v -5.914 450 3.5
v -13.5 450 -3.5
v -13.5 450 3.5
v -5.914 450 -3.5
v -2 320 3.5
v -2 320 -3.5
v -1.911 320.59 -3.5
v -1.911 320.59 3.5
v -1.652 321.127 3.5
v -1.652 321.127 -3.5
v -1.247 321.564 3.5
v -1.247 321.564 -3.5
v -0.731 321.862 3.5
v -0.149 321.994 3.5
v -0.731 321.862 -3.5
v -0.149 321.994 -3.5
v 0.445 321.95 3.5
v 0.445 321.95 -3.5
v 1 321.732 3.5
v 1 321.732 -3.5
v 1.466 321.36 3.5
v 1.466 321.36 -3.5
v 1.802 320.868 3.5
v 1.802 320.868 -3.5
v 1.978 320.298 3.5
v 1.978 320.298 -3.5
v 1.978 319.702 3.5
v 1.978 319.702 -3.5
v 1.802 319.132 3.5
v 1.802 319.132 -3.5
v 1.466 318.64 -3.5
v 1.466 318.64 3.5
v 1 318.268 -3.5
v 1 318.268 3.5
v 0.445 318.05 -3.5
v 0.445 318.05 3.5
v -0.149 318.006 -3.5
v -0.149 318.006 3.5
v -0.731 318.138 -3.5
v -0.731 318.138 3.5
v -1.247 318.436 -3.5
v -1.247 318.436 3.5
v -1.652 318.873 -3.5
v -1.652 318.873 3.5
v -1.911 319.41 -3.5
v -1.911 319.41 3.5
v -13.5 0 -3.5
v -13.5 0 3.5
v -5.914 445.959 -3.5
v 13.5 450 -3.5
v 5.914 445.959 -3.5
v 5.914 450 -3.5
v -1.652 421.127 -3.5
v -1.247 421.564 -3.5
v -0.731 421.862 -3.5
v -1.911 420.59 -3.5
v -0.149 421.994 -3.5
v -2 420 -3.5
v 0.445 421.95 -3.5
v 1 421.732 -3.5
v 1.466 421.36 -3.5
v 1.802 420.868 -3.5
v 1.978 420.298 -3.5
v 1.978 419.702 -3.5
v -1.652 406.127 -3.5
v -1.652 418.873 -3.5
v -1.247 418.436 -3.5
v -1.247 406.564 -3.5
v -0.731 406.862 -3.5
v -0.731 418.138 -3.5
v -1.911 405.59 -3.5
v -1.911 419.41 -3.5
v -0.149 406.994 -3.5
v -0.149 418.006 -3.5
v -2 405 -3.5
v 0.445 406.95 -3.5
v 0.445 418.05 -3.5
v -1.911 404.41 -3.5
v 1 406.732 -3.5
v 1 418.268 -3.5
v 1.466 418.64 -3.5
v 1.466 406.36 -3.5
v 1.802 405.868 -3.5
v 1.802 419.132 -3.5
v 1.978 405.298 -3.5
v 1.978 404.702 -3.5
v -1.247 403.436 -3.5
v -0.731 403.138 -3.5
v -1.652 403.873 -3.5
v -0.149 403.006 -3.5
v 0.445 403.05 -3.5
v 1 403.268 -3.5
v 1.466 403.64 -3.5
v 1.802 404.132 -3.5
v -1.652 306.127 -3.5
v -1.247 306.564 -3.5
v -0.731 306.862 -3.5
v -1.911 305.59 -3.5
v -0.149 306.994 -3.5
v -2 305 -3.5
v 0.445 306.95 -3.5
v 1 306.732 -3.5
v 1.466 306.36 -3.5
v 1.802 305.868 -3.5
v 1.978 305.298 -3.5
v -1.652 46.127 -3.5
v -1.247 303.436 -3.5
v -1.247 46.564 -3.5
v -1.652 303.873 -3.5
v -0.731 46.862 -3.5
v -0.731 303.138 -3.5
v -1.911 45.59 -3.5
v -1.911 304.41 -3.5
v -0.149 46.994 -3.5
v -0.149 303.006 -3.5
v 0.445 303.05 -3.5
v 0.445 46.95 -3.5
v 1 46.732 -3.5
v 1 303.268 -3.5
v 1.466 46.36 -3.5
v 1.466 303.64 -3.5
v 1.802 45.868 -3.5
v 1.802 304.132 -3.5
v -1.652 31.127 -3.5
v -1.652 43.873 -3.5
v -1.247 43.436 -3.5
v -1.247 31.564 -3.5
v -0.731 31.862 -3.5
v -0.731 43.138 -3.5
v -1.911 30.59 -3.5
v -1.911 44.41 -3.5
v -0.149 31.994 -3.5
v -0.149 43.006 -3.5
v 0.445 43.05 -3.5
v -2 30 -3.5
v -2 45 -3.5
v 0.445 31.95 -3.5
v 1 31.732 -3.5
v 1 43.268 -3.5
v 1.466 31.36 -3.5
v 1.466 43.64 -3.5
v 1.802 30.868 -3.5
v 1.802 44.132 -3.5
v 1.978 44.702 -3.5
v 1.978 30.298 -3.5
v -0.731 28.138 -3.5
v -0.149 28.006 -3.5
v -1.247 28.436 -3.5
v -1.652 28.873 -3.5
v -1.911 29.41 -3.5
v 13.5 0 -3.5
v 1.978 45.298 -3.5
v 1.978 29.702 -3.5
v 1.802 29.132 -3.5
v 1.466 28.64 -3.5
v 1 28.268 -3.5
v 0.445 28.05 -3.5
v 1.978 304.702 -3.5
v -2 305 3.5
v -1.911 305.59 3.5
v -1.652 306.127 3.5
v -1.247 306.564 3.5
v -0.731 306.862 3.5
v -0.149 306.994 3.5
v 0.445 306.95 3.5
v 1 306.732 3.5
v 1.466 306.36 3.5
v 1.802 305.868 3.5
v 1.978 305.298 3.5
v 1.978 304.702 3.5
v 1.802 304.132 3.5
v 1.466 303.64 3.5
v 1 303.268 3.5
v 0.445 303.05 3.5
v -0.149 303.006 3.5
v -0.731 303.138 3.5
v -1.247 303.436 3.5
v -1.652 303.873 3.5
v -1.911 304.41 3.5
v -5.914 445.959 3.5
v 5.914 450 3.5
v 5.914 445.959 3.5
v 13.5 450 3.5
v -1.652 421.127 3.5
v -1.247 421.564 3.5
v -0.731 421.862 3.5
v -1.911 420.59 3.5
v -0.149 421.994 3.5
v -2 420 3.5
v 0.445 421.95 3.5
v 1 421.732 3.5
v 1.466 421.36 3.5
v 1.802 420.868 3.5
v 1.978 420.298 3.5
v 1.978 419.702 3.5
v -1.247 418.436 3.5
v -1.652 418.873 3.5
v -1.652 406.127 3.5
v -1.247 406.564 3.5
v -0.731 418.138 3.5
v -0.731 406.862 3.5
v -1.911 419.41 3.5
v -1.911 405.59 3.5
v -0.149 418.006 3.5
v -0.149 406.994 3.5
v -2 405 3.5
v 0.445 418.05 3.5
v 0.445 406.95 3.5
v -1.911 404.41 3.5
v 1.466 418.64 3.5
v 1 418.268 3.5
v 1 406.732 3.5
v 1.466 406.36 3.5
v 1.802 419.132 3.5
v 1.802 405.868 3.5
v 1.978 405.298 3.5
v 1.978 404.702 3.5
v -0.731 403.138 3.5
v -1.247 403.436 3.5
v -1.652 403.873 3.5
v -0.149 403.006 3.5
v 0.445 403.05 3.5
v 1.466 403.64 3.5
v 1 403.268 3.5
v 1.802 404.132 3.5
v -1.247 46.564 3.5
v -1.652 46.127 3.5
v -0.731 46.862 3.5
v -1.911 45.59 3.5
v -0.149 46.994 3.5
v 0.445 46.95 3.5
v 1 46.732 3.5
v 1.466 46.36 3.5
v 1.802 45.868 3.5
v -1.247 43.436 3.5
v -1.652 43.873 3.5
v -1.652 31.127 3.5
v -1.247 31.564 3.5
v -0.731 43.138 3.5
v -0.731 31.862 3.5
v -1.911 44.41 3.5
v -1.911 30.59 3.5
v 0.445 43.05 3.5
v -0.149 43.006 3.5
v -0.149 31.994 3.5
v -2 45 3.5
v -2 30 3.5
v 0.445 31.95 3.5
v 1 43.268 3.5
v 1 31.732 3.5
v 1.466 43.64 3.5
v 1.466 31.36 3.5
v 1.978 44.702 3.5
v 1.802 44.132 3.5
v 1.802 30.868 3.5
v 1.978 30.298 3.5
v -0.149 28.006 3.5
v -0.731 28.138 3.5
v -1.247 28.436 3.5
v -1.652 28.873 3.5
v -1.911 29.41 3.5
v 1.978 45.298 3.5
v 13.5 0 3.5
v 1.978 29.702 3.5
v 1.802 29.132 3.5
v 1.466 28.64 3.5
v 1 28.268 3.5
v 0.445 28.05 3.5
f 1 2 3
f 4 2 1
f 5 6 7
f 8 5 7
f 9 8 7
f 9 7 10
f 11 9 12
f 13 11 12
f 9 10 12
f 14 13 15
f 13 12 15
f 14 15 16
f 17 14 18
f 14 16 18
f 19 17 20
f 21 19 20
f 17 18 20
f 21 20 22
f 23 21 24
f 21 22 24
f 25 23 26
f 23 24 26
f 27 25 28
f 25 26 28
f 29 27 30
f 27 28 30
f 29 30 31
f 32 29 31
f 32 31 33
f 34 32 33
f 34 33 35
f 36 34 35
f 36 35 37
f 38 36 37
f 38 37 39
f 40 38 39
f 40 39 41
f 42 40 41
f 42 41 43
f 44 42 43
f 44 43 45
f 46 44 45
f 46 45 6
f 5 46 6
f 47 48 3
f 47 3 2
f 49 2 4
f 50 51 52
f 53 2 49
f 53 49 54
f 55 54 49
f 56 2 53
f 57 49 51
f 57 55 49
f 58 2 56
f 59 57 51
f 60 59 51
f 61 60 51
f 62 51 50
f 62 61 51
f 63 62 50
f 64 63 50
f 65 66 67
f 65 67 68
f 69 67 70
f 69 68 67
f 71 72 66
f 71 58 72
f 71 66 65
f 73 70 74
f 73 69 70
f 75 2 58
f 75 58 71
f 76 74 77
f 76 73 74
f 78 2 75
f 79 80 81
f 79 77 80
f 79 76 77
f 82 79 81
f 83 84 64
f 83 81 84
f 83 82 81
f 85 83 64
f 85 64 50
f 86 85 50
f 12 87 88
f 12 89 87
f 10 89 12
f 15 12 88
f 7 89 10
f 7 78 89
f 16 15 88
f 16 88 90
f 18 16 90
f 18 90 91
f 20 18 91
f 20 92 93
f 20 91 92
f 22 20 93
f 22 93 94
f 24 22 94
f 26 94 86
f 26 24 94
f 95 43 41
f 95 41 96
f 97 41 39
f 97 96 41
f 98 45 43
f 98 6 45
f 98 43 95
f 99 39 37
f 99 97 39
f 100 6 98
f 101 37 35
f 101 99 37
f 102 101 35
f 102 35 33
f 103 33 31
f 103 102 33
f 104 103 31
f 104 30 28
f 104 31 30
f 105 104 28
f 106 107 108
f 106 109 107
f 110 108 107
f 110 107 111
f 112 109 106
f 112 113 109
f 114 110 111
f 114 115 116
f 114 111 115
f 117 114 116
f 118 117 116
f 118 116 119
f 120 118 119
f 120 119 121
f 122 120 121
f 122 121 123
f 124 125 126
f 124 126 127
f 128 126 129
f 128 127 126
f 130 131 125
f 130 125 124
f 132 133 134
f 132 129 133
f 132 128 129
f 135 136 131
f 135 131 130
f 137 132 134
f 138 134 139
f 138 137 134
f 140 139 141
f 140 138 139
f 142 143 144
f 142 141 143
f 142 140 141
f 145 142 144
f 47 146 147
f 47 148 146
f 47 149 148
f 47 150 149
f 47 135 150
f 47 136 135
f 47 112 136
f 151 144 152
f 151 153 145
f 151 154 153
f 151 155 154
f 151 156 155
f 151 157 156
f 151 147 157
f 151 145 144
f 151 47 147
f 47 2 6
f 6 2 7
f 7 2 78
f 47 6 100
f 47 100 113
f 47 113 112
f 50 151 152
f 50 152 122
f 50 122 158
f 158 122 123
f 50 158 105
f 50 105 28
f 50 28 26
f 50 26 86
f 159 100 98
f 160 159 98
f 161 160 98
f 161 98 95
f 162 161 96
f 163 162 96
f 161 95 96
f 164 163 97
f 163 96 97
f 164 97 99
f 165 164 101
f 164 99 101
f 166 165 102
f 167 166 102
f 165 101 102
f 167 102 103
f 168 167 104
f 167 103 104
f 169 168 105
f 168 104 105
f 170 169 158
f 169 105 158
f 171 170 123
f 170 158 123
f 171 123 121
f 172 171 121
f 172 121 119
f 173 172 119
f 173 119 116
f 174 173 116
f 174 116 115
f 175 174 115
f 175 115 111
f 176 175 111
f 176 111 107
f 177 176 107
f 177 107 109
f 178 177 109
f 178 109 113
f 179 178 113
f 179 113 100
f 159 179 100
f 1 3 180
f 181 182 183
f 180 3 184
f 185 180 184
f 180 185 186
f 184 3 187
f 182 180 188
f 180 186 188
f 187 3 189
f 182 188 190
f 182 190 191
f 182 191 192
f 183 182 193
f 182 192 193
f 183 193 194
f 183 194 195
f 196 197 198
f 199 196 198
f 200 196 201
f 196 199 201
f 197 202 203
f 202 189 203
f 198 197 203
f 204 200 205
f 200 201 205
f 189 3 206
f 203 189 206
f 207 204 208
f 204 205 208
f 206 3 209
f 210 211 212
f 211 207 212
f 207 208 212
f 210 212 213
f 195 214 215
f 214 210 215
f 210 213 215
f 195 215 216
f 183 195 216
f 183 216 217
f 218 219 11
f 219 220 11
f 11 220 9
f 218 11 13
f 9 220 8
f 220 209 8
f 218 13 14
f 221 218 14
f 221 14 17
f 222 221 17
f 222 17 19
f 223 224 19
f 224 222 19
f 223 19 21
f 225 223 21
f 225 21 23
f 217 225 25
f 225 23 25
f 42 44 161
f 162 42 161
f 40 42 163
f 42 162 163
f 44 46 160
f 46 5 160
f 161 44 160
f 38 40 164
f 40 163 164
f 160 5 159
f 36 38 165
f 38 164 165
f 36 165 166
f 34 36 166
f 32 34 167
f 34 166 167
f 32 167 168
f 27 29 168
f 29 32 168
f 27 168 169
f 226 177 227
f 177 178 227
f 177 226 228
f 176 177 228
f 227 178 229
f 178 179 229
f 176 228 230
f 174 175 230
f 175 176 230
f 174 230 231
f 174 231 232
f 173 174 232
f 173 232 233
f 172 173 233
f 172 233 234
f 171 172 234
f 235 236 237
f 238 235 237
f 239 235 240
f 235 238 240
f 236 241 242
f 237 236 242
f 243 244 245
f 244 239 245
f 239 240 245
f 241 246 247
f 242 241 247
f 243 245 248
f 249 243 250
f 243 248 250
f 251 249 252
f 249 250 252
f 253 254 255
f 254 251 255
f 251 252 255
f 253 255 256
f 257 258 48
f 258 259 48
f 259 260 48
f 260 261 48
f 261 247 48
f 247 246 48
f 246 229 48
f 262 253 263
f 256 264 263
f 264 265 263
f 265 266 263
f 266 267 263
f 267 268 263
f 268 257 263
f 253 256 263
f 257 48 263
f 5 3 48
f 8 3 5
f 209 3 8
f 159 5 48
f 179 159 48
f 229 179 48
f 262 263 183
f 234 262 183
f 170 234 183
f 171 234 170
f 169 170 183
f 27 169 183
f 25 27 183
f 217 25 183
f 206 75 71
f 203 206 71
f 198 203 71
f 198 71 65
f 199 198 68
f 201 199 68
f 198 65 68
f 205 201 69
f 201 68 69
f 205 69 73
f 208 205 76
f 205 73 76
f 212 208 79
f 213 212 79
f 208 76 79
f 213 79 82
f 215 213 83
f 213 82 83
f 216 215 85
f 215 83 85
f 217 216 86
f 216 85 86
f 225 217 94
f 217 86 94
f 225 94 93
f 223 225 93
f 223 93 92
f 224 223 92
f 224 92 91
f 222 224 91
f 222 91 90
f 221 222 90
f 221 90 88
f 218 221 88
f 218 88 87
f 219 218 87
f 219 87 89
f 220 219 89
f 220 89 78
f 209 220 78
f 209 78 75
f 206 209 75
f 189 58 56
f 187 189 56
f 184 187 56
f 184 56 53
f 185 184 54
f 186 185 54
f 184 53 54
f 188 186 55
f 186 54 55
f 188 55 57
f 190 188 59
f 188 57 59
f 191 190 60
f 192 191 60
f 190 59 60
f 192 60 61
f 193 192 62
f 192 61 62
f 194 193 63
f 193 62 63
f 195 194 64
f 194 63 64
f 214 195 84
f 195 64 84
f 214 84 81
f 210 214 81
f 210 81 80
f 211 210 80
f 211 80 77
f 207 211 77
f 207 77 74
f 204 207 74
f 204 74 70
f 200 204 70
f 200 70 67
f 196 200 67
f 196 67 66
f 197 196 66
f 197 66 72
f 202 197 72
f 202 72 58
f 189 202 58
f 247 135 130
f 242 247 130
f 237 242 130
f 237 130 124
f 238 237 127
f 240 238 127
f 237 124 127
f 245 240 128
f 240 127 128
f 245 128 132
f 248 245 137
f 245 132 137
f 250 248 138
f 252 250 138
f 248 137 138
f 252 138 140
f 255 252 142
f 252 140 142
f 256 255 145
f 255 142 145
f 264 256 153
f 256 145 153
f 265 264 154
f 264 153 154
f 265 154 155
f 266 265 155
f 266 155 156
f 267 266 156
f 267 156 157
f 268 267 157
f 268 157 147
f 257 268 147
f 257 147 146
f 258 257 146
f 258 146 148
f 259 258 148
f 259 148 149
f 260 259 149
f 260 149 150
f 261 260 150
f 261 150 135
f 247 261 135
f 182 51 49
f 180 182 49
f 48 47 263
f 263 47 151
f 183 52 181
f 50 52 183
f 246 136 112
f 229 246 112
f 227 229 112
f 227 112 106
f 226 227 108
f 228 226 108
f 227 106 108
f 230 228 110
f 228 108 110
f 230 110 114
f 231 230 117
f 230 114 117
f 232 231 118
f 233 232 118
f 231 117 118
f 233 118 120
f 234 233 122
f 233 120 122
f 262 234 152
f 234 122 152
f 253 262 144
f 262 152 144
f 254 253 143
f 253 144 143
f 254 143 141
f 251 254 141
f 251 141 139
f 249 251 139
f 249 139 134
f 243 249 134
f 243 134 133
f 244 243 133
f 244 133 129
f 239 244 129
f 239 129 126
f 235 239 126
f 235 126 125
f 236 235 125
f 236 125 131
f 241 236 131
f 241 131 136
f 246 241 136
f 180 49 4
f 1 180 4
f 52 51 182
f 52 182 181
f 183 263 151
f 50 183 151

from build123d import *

# Parameters (mm, degrees)
SKETCH_1_W          = 27
SKETCH_1_H          = 7
EXTRUDE_1_DEPTH     = 450
SKETCH_2_W          = 11.82792619
SKETCH_2_H          = 8.082032634
CUT_EXTRUDE_1_DEPTH = 8
SKETCH_3_R          = 2
CUT_EXTRUDE_2_DEPTH = 8


with BuildPart() as part:
    # 草图1 → 凸台-拉伸1 (new body)
    with BuildSketch(Plane(origin=(0, 0, 0), x_dir=(1, 0, 0), z_dir=(0, 1, 0))):
        Rectangle(SKETCH_1_W, SKETCH_1_H)
    extrude(amount=EXTRUDE_1_DEPTH)

    # 草图2 → 切除-拉伸1 (cut, through all)
    with BuildSketch(Plane(origin=(0, 0, -3.5), x_dir=(-1, 0, 0), z_dir=(0, 0, -1))):
        with Locations((0, 450)):
            Rectangle(SKETCH_2_W, SKETCH_2_H)
    extrude(amount=-CUT_EXTRUDE_1_DEPTH, mode=Mode.SUBTRACT)

    # 草图3 → 切除-拉伸2 (cut, through all)
    with BuildSketch(Plane(origin=(0, 0, -3.5), x_dir=(-1, 0, 0), z_dir=(0, 0, -1))):
        with Locations((0, 420)):
            Circle(SKETCH_3_R)
        with Locations((0, 405)):
            Circle(SKETCH_3_R)
        with Locations((0, 320)):
            Circle(SKETCH_3_R)
        with Locations((0, 305)):
            Circle(SKETCH_3_R)
        with Locations((0, 30)):
            Circle(SKETCH_3_R)
        with Locations((0, 45)):
            Circle(SKETCH_3_R)
    extrude(amount=-CUT_EXTRUDE_2_DEPTH, mode=Mode.SUBTRACT)


solid = part.part
